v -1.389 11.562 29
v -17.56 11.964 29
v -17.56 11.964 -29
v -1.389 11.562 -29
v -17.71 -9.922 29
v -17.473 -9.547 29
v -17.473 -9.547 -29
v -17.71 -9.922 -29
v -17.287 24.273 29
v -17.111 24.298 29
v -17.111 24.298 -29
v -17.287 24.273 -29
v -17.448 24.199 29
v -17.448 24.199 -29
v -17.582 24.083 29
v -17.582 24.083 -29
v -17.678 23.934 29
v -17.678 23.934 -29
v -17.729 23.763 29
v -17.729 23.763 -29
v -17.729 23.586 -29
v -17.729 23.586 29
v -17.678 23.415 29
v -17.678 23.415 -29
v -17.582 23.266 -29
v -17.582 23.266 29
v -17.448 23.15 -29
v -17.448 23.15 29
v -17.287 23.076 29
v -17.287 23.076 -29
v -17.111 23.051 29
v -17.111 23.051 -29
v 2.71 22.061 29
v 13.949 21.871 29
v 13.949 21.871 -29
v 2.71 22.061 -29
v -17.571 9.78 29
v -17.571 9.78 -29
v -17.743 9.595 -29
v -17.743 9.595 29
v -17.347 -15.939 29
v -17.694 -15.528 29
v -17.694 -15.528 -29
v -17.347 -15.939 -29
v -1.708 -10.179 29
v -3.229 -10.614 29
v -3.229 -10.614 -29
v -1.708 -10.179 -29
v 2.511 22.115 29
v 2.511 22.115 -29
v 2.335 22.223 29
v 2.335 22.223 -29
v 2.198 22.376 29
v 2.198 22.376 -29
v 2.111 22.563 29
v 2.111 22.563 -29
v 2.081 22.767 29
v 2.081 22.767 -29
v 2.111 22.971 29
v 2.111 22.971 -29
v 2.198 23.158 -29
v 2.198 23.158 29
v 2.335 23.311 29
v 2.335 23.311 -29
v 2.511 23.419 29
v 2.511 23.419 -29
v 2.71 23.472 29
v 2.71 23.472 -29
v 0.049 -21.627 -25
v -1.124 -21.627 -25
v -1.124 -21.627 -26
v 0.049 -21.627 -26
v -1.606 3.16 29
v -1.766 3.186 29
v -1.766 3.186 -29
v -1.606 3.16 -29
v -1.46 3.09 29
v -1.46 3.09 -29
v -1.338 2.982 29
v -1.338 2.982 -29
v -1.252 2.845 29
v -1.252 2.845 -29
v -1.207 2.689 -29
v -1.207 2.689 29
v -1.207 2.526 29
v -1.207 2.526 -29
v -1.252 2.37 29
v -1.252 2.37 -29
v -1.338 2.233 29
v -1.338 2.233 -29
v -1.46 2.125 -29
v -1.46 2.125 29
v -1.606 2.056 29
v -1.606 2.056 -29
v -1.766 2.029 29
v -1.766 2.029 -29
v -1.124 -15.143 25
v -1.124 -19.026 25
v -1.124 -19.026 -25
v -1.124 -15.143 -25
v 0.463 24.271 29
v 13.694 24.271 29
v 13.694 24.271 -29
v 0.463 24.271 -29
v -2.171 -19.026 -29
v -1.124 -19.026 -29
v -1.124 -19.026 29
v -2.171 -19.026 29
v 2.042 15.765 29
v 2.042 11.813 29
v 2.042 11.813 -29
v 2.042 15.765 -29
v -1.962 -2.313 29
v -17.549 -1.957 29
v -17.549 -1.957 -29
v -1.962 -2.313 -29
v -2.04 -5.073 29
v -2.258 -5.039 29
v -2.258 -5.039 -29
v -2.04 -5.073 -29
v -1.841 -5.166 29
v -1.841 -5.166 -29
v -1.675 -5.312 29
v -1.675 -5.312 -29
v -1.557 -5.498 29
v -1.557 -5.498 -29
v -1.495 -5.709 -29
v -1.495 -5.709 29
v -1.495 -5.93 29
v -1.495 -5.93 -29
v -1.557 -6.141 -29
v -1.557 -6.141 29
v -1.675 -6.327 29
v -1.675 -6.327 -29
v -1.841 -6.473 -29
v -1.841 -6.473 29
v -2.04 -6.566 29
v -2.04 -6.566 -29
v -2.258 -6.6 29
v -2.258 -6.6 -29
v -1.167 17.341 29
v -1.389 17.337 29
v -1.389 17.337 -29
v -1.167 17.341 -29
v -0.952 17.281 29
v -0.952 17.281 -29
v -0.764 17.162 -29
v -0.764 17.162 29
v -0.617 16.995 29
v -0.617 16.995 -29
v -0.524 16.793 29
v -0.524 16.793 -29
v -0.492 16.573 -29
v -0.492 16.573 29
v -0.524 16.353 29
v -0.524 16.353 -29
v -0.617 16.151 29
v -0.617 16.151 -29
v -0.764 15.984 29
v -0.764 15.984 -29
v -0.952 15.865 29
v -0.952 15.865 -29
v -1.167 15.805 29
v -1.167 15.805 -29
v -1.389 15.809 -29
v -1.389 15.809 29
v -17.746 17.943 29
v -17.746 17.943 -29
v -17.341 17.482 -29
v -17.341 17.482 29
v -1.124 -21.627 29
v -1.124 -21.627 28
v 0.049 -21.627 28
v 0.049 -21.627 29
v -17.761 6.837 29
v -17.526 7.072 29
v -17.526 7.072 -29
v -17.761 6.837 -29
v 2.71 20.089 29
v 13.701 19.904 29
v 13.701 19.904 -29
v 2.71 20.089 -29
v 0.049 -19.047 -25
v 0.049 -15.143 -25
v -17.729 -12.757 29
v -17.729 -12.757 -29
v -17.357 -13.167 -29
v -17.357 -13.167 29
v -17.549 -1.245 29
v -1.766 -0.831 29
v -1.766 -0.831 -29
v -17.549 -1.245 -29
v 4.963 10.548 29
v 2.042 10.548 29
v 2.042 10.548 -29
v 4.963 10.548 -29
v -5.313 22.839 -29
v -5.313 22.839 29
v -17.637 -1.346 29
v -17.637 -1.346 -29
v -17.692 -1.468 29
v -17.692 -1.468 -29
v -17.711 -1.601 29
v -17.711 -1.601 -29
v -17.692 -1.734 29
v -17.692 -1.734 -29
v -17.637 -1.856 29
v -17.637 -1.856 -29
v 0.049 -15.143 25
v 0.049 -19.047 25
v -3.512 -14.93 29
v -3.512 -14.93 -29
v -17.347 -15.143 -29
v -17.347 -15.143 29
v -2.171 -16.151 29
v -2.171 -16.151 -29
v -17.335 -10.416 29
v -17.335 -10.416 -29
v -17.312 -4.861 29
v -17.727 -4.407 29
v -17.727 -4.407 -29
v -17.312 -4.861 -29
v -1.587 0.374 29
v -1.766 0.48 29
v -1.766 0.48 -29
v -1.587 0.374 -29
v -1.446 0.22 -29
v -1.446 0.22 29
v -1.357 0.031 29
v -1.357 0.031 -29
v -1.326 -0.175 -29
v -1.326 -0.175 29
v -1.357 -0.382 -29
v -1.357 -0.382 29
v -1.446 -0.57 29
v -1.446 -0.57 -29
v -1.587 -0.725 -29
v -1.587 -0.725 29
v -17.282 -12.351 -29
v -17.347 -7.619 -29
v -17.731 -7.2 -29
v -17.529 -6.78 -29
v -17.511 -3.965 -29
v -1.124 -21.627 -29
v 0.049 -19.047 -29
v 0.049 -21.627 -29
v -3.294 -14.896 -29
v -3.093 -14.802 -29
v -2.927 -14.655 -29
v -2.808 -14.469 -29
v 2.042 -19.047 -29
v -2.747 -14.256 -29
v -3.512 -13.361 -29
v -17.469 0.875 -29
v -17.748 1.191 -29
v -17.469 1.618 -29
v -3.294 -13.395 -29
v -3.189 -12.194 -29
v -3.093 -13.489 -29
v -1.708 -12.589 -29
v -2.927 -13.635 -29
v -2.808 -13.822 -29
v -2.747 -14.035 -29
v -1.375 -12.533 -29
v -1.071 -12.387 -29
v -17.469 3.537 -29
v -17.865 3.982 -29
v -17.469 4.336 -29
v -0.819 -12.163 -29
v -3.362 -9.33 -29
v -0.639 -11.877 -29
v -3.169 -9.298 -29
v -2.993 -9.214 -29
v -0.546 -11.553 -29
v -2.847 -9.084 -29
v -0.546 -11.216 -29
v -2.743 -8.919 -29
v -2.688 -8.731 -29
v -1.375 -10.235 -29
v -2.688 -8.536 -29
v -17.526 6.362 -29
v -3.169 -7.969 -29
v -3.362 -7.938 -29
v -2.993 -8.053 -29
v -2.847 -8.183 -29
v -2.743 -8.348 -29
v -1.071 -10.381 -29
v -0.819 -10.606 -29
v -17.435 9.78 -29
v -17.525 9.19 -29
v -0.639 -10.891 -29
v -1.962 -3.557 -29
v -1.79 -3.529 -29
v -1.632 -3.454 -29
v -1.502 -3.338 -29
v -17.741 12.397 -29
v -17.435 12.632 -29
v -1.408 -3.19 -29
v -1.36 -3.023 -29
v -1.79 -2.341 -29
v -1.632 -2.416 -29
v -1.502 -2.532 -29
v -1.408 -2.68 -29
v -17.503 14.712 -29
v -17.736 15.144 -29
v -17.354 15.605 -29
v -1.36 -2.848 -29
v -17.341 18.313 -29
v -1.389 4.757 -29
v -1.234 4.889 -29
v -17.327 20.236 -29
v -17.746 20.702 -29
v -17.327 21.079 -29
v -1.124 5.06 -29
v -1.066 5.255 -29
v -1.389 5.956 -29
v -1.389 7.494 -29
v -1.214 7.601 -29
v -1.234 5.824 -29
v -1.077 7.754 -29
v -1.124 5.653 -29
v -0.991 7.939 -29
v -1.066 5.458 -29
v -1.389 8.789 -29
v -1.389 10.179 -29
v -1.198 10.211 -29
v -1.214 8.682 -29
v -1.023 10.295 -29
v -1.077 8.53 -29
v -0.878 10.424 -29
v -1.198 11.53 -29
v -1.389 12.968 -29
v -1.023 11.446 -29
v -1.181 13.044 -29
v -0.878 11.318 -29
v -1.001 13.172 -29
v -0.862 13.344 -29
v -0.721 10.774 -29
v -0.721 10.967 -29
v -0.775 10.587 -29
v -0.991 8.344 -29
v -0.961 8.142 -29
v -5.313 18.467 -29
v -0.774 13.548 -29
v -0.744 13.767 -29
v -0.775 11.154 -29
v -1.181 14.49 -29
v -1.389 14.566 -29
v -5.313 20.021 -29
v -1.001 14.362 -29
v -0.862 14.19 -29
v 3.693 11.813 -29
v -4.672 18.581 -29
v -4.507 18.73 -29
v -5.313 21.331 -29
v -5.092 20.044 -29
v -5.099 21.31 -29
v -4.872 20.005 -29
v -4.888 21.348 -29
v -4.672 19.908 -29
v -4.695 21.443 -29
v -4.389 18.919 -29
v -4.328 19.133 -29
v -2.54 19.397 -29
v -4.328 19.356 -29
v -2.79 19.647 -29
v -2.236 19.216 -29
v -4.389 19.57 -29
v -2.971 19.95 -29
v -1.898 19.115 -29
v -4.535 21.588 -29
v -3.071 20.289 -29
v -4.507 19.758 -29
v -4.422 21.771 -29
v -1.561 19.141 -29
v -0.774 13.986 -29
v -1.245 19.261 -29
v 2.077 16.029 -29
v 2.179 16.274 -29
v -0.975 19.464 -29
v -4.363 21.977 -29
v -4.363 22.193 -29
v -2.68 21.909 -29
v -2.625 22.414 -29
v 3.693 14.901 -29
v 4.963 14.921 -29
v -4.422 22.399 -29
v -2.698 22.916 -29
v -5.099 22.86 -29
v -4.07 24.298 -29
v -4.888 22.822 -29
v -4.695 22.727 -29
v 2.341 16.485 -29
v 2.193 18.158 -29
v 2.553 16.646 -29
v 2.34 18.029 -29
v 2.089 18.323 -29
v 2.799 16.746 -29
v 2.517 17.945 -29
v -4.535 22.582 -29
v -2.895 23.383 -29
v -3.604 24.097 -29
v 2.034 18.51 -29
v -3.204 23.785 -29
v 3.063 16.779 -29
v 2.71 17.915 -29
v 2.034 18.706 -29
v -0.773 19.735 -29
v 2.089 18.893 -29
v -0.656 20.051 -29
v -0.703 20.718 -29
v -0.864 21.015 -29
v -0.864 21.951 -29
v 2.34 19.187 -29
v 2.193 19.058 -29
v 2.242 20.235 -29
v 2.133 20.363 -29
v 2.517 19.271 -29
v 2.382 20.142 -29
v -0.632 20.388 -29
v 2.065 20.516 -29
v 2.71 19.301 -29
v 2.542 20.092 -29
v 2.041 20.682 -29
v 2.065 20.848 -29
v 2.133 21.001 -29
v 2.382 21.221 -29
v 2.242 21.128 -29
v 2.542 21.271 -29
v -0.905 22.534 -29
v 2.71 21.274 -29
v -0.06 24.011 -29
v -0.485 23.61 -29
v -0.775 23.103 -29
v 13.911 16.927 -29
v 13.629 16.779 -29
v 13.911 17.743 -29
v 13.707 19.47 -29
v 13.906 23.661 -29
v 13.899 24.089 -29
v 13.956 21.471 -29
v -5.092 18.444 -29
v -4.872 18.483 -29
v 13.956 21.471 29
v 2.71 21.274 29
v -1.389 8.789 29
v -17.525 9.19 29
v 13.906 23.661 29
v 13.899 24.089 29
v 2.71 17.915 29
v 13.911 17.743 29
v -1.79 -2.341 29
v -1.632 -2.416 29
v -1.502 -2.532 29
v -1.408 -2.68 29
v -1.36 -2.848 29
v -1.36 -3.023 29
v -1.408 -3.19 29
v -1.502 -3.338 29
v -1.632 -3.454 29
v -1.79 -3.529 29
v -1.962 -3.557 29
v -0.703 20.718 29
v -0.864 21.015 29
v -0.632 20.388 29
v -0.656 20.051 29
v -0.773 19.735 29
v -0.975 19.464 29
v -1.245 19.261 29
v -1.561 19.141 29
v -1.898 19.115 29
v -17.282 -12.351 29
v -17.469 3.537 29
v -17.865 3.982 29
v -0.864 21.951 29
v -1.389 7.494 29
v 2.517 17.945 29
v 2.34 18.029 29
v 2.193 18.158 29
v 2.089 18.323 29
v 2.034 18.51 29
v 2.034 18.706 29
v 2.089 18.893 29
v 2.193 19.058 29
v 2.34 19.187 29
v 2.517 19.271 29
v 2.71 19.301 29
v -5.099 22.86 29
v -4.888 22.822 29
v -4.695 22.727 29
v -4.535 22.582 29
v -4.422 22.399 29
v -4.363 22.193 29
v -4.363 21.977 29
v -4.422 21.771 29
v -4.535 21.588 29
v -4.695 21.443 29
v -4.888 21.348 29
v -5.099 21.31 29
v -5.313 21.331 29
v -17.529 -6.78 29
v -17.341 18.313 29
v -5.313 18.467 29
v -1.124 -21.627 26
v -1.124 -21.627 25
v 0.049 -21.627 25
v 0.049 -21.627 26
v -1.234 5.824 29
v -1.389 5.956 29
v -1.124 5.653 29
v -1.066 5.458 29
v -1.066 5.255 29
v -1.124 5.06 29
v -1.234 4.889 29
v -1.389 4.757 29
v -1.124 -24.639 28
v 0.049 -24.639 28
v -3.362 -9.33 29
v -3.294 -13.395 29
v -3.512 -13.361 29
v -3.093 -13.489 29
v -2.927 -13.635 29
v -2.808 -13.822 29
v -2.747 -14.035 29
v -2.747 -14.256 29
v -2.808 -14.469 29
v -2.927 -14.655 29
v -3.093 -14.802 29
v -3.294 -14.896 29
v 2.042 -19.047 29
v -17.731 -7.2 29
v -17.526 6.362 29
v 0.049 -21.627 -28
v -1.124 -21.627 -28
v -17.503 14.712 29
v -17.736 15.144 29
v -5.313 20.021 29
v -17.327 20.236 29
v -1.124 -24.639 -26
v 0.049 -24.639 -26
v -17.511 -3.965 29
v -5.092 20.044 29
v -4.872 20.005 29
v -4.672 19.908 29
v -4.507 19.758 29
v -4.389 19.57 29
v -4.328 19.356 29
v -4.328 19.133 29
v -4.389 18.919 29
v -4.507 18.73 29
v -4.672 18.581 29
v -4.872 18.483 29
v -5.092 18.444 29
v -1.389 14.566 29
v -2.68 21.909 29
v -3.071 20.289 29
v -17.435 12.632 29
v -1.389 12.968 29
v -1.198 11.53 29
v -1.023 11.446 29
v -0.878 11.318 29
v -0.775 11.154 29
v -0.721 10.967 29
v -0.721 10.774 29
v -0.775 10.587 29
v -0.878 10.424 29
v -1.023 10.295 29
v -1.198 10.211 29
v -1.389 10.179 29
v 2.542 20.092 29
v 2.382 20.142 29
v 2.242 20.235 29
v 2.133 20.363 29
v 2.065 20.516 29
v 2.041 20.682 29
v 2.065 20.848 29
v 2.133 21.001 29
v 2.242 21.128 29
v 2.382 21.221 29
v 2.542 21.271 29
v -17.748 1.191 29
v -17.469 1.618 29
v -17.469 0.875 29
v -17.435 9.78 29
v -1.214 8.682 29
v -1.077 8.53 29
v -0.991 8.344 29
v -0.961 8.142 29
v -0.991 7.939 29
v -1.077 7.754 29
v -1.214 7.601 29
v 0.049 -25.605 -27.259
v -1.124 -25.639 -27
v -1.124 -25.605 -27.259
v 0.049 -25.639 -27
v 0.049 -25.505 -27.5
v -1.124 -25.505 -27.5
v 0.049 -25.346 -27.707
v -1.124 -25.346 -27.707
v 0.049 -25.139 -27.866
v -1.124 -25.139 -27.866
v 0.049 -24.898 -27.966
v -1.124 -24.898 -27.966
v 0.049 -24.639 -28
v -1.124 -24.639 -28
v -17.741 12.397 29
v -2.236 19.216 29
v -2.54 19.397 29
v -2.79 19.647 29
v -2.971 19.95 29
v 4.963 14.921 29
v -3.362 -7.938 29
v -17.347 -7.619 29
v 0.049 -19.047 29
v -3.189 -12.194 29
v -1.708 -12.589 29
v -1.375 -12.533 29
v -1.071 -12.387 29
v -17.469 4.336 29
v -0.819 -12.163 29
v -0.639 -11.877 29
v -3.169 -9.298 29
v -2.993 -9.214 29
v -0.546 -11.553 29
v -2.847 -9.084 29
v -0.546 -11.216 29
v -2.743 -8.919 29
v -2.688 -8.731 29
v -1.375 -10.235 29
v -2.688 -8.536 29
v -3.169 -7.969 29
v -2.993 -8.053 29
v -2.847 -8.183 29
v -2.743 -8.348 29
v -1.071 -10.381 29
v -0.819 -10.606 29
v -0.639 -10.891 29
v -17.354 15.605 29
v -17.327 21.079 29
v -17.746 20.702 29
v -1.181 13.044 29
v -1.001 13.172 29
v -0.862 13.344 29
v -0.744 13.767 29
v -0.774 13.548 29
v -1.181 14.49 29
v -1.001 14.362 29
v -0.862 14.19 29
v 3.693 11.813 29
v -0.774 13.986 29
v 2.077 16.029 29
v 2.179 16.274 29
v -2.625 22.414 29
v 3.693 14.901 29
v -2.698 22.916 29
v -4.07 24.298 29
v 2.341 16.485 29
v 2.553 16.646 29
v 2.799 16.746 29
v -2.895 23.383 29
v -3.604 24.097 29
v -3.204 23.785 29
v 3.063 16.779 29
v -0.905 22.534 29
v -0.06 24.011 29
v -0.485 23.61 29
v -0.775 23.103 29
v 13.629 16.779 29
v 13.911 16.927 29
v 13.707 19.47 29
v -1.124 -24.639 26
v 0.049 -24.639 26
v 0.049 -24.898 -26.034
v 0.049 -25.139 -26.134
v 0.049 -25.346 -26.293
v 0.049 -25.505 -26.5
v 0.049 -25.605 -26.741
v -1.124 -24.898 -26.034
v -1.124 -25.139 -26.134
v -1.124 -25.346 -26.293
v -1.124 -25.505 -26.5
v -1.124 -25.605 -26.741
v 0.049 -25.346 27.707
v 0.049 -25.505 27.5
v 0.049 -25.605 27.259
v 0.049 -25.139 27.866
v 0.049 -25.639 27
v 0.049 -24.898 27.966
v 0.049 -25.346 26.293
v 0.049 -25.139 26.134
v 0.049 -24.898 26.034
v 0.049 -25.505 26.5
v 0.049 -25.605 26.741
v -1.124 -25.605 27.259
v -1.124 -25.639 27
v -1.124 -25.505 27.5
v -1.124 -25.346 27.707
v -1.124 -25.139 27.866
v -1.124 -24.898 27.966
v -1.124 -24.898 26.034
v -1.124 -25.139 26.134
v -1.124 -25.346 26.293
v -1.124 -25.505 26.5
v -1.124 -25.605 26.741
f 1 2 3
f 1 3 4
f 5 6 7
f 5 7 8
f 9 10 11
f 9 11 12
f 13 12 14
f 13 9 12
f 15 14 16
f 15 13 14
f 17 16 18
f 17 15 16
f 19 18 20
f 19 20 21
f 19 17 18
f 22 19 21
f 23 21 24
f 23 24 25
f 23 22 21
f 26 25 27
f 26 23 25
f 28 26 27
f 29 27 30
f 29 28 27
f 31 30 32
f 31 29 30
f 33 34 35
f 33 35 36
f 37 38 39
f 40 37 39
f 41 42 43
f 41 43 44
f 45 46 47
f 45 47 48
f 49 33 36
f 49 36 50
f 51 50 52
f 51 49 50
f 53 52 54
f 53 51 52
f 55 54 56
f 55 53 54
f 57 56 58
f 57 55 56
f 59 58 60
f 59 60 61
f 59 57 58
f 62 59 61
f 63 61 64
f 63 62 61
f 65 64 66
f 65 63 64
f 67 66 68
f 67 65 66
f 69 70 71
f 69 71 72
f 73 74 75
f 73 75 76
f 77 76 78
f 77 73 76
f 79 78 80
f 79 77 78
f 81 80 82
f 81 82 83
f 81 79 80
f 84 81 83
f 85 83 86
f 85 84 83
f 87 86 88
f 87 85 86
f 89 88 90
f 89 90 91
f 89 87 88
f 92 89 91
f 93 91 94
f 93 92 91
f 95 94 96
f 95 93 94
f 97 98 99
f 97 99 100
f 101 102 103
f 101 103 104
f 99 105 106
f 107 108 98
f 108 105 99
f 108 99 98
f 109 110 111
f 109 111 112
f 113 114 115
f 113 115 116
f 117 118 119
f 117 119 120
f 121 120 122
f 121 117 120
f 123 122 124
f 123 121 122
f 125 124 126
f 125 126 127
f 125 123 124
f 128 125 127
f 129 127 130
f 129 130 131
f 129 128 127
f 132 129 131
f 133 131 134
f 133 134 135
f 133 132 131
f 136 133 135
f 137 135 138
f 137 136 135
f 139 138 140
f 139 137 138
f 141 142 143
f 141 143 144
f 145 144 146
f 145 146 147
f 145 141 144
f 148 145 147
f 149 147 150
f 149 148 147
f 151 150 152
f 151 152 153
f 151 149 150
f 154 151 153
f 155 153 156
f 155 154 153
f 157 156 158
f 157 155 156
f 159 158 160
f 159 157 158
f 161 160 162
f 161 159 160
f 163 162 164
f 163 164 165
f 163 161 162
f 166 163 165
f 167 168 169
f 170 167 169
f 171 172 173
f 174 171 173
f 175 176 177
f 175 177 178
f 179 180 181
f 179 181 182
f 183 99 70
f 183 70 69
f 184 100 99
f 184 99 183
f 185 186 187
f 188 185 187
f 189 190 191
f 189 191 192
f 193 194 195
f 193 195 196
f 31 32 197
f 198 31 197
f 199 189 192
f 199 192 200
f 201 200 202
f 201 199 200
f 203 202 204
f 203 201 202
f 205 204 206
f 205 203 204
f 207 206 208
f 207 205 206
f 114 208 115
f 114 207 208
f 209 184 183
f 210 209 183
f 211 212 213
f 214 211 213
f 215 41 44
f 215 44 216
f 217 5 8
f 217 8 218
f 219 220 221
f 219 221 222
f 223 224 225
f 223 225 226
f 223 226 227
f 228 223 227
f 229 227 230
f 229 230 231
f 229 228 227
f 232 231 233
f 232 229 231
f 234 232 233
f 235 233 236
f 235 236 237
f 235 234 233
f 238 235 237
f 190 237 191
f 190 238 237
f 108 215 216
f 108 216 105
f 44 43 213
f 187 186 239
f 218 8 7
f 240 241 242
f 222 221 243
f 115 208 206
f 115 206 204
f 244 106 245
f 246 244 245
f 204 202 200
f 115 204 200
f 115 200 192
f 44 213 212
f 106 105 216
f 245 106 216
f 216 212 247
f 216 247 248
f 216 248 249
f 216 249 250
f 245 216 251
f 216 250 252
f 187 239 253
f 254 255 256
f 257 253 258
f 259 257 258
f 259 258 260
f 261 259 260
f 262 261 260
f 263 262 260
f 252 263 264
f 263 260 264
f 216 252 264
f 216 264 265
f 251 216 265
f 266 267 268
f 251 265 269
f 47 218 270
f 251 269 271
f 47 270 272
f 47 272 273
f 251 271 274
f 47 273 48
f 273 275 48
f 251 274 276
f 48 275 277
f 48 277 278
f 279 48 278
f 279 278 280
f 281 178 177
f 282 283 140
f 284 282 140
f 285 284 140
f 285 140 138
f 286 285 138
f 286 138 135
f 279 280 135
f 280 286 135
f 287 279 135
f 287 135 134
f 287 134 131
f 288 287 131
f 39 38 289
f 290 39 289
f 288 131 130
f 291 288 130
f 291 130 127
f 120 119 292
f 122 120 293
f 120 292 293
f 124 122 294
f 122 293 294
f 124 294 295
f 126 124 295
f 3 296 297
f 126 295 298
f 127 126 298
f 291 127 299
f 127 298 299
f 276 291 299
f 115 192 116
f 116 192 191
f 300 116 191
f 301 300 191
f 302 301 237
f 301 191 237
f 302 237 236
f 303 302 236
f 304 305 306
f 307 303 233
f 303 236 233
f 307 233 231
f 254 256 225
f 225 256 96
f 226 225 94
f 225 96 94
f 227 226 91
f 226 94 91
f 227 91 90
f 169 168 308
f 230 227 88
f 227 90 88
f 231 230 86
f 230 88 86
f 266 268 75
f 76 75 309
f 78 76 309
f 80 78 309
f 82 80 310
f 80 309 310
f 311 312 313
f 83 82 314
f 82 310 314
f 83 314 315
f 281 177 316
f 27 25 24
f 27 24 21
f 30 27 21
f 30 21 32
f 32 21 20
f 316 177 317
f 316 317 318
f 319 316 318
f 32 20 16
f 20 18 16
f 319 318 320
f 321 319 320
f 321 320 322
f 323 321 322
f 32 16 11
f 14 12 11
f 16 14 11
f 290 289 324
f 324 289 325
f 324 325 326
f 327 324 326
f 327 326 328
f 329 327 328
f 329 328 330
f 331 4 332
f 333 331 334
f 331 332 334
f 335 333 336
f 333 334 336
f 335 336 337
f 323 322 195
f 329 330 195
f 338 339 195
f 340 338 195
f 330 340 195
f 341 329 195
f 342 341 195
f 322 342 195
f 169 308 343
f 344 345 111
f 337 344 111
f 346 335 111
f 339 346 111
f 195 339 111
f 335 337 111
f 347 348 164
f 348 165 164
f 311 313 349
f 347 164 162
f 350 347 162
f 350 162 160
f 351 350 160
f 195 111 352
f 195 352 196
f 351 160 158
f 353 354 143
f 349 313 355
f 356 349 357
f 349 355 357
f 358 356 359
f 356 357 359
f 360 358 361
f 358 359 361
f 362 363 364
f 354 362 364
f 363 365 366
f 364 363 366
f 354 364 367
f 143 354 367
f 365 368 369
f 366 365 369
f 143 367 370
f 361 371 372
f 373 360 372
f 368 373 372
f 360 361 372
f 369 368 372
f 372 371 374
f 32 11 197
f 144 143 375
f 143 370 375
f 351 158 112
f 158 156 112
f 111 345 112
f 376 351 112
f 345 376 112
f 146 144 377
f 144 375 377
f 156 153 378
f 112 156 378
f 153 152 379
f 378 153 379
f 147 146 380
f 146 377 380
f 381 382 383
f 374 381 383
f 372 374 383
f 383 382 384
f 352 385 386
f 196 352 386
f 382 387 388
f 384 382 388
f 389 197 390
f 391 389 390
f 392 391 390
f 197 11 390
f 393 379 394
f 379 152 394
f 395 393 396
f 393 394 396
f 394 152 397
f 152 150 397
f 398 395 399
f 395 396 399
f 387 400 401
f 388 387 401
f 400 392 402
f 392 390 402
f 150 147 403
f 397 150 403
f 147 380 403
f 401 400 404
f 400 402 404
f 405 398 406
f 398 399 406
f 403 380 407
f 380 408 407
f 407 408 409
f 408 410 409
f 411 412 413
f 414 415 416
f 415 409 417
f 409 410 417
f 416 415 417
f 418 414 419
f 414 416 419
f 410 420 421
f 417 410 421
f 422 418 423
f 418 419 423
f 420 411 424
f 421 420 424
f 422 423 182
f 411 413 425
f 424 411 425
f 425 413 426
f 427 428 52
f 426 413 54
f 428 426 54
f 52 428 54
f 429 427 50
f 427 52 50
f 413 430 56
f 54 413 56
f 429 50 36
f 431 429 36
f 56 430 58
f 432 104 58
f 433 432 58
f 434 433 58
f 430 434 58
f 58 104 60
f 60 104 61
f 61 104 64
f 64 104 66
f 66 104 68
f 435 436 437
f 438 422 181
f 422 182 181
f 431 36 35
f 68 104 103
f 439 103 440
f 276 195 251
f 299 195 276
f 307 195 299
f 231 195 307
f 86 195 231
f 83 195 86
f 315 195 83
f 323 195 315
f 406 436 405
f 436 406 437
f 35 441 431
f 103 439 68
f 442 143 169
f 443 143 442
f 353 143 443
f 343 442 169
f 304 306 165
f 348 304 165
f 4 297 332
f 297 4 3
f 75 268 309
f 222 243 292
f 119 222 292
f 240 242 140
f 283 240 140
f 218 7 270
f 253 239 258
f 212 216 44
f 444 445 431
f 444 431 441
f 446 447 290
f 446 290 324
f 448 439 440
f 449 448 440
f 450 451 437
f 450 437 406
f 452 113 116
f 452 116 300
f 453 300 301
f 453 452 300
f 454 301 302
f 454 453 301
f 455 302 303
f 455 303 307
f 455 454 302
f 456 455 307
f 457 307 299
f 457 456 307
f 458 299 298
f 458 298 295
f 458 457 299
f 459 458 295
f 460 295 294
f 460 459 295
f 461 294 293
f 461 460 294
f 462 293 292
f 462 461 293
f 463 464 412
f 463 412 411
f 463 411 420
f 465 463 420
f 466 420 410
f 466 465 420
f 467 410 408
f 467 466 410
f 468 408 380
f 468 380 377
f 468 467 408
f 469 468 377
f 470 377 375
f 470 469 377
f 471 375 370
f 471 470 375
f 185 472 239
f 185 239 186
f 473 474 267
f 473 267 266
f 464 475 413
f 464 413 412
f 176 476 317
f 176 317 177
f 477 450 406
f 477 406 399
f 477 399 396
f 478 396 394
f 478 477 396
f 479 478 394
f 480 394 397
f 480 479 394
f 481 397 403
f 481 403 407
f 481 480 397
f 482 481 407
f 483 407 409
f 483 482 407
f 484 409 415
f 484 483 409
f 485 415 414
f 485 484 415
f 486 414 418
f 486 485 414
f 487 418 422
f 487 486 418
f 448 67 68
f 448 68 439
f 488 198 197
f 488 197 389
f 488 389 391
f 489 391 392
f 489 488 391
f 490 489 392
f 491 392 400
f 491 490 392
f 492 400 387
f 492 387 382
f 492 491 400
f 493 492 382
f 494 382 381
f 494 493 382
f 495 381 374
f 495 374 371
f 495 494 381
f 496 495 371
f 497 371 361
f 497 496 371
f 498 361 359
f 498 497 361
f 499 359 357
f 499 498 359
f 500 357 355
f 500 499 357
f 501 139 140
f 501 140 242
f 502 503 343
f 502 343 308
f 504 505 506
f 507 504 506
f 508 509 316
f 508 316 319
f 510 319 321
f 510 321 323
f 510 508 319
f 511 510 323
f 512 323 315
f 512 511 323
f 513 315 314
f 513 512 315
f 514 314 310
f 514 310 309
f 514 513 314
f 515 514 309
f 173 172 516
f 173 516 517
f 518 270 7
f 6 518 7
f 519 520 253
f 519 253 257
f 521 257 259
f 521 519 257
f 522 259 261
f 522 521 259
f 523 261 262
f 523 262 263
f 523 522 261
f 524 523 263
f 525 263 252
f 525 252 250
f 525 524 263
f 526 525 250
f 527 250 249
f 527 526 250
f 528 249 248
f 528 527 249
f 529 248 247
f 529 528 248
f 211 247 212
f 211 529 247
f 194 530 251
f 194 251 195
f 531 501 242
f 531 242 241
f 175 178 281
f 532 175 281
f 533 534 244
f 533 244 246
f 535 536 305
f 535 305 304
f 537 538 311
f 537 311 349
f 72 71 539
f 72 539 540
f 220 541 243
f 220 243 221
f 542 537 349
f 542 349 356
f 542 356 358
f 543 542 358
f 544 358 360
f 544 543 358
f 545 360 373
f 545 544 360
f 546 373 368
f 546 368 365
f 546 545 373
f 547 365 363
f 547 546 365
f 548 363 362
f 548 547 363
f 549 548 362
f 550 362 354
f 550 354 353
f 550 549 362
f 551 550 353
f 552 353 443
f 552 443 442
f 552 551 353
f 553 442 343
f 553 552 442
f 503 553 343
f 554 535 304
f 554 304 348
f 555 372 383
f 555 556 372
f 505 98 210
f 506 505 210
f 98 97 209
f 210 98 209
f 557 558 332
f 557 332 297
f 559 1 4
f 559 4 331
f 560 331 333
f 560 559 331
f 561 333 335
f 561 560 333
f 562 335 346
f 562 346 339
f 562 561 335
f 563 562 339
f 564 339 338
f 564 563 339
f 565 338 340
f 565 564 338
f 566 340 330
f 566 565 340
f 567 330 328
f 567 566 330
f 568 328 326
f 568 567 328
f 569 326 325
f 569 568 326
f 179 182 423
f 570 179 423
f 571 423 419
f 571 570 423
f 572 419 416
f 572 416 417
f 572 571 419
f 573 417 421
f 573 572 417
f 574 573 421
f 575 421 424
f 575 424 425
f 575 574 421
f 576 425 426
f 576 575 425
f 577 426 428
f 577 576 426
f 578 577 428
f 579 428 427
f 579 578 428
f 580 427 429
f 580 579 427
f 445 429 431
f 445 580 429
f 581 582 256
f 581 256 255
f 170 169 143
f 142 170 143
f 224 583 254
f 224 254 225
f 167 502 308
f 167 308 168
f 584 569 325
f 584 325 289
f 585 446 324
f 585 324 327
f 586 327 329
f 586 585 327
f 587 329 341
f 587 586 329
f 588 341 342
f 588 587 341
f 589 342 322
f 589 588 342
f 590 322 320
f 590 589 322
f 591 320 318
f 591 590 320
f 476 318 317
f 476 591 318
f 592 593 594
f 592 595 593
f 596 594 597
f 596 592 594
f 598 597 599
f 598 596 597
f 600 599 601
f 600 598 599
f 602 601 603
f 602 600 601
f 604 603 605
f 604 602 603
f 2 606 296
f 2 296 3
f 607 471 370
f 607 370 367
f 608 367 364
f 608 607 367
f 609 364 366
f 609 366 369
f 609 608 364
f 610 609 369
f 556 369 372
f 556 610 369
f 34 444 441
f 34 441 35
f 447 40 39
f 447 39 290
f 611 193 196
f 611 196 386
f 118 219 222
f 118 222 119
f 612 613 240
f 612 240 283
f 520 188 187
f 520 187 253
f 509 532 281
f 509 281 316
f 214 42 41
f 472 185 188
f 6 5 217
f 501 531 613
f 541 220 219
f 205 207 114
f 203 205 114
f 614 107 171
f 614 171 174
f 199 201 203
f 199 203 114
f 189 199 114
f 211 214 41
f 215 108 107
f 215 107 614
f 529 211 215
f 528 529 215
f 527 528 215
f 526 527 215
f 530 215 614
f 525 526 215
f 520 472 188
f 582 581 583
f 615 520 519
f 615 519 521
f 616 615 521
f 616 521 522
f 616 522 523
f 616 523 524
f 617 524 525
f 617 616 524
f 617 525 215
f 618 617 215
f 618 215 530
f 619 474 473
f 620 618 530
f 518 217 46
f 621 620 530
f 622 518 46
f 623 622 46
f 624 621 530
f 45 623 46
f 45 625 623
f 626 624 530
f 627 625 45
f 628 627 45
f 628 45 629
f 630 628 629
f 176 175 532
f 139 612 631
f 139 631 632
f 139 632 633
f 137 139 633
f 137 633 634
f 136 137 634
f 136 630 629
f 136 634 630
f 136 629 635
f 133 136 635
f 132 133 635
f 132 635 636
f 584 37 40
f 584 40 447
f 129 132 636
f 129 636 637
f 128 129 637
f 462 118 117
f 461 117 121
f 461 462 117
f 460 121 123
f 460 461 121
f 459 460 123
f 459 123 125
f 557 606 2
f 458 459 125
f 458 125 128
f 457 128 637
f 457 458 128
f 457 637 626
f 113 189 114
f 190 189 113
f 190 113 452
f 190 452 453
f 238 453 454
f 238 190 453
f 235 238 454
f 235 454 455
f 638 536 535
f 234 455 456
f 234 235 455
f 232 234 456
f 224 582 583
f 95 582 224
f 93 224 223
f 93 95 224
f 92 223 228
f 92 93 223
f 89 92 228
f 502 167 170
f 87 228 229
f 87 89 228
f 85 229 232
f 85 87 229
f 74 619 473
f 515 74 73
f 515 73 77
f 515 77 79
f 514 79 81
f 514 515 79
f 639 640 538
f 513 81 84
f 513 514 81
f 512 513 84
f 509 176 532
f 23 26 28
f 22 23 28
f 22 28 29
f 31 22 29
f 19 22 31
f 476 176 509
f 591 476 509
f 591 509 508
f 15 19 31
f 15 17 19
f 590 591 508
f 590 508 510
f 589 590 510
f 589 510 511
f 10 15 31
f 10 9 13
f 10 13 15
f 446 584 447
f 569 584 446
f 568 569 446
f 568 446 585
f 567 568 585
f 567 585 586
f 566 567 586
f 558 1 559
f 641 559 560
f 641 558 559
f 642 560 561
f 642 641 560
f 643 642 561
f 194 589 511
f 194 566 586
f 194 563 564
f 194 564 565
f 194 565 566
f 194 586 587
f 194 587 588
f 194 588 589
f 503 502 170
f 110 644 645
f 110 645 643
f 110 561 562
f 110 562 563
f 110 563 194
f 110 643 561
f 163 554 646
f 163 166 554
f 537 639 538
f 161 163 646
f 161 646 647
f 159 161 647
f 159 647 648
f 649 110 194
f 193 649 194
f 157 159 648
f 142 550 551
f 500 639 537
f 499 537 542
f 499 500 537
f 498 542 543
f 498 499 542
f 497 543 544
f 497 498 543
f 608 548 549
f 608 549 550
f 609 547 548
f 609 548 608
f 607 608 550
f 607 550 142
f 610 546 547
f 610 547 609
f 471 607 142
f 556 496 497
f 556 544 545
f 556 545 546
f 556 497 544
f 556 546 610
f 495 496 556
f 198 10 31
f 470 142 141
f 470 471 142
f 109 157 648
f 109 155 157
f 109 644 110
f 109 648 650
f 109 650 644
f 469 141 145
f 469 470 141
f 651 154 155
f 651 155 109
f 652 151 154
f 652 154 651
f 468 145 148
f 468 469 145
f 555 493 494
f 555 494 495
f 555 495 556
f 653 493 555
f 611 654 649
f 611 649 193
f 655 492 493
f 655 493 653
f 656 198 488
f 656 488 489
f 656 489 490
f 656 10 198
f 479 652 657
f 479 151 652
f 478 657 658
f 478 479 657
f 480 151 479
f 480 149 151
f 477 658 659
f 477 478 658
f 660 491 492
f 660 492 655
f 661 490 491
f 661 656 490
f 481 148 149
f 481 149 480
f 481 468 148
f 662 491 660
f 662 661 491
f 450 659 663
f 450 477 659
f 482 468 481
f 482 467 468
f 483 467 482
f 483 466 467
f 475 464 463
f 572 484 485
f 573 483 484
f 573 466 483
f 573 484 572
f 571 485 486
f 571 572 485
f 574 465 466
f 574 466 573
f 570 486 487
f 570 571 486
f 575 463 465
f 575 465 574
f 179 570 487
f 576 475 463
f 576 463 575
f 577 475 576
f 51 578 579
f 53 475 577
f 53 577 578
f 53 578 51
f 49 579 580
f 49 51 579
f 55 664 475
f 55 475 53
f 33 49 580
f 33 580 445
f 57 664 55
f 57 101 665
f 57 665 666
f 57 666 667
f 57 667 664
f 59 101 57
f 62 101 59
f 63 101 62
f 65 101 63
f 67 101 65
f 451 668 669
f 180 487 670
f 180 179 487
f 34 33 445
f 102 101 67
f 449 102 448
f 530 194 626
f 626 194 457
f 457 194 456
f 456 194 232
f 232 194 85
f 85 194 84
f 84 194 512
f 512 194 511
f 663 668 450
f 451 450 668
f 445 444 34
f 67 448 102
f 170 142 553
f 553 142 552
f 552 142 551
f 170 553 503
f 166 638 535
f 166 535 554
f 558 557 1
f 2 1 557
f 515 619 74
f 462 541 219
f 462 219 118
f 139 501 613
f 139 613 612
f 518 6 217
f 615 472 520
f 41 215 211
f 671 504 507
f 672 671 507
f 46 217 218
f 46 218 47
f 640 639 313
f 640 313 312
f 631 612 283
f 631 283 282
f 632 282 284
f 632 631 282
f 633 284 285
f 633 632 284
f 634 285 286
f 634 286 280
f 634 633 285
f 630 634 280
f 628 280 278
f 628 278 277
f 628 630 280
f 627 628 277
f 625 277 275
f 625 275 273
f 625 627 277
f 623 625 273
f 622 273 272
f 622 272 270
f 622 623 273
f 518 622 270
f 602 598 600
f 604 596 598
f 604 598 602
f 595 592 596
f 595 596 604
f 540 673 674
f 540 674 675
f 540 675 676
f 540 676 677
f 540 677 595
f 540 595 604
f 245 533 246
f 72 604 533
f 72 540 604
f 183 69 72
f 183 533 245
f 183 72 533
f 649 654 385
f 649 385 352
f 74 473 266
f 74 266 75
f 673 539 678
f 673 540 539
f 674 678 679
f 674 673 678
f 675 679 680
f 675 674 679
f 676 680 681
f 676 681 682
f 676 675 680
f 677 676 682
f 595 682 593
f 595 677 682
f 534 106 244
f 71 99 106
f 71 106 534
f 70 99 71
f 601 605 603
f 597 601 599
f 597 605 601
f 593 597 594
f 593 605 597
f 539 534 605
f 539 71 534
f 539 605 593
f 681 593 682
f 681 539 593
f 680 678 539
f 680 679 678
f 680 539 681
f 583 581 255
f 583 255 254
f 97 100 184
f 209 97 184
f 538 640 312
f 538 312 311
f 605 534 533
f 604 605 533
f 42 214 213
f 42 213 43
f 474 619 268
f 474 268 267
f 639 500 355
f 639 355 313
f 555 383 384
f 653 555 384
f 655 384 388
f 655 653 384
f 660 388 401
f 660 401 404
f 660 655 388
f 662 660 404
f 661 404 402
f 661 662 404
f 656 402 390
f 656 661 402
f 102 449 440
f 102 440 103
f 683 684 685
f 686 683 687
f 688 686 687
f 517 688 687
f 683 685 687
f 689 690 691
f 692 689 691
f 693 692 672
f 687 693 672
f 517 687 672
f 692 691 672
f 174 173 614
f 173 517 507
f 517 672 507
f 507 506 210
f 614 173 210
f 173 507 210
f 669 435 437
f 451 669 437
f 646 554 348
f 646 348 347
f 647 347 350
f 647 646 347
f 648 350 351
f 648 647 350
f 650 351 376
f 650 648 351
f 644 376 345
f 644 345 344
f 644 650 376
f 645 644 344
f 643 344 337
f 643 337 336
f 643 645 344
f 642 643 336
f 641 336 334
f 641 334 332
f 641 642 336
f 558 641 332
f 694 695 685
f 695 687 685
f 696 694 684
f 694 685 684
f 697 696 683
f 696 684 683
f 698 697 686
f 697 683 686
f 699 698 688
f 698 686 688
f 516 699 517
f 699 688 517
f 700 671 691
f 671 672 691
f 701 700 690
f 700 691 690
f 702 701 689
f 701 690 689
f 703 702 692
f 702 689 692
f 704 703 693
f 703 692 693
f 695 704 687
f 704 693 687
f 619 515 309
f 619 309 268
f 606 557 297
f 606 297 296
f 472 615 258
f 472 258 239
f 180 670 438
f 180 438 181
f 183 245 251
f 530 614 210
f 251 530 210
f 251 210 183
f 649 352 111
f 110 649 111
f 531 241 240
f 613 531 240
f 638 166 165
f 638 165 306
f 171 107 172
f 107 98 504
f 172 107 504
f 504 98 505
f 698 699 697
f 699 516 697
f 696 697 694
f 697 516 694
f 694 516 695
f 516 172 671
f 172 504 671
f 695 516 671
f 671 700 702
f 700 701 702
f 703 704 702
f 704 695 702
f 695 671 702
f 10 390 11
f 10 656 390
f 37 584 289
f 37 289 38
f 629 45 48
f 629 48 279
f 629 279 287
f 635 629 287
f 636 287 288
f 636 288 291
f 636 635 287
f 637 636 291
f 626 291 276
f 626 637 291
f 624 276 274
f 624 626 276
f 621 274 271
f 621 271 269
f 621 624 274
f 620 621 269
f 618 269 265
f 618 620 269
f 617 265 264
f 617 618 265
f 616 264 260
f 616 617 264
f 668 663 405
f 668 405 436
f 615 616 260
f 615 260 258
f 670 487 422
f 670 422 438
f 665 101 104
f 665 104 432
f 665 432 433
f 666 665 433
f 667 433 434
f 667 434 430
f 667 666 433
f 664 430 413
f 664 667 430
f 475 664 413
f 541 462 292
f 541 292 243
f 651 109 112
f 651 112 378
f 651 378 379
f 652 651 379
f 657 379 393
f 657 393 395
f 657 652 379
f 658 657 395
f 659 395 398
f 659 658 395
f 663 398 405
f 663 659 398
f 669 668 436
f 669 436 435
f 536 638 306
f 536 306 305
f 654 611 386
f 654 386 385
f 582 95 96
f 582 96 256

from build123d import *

# Parameters (mm, degrees)
F1_DEPTH = 29
F2_START = 25
F2_DEPTH = 4
F3_START = -25
F3_DEPTH = 4
F4_START = 26
F0_W     = 1.172746277
F0_H     = 3.0541475862
F0_H_2   = 0.957692816
F4_DEPTH = 2
F5_START = -26
F5_DEPTH = 2
F6_R     = 0.99999


# Not quite as in the source:
# - a fillet or chamfer is up to 0.001 mm smaller than in the source, because OpenCascade refuses the exact size


with BuildPart() as f1:
    # F0 (on Top) → F1 (new body, symmetric)
    with BuildSketch(Plane.XY):
        with BuildLine():
            Line((-4.0699890815, 24.2982581258), (-17.1110220253, 24.2982581258))
            ThreePointArc((-17.1110220253, 24.2982581258), (-17.7348526195, 23.6744275317), (-17.1110220253, 23.0505969375))
            Line((-17.1110220253, 23.0505969375), (-5.313185975, 22.8393822908))
            ThreePointArc((-5.313185975, 22.8393822908), (-4.3551853687, 22.085041739), (-5.313185975, 21.3307011873))
            Line((-5.313185975, 21.3307011873), (-17.3267684877, 21.0792534053))
            Line((-17.3267684877, 21.0792534053), (-17.7458468825, 20.7020826638))
            Line((-17.7458468825, 20.7020826638), (-17.3267684877, 20.2364402329))
            Line((-17.3267684877, 20.2364402329), (-5.313185975, 20.0213631141))
            ThreePointArc((-5.313185975, 20.0213631141), (-4.319986106, 19.2441805029), (-5.313185975, 18.4669978917))
            Line((-5.313185975, 18.4669978917), (-17.3407383263, 18.3133352548))
            Line((-17.3407383263, 18.3133352548), (-17.7458468825, 17.9431512952))
            Line((-17.7458468825, 17.9431512952), (-17.3407383263, 17.4823310226))
            Line((-17.3407383263, 17.4823310226), (-1.3890911359, 17.3372328281))
            ThreePointArc((-1.3890911359, 17.3372328281), (-0.492008259, 16.5730640292), (-1.3890911359, 15.8088952303))
            Line((-1.3890911359, 15.8088952303), (-17.3541552482, 15.6049273923))
            Line((-17.3541552482, 15.6049273923), (-17.7356619388, 15.1443993673))
            Line((-17.7356619388, 15.1443993673), (-17.5030883402, 14.7124780342))
            Line((-17.5030883402, 14.7124780342), (-1.3890911359, 14.5659030835))
            ThreePointArc((-1.3890911359, 14.5659030835), (-0.7437511811, 13.7670414267), (-1.3890911359, 12.9681797698))
            Line((-1.3890911359, 12.9681797698), (-17.4349947409, 12.6323343327))
            Line((-17.4349947409, 12.6323343327), (-17.7414808422, 12.3967602849))
            Line((-17.7414808422, 12.3967602849), (-17.5598803908, 11.9637120515))
            Line((-17.5598803908, 11.9637120515), (-1.3890911359, 11.5619925782))
            ThreePointArc((-1.3890911359, 11.5619925782), (-0.7146102661, 10.8705479652), (-1.3890911359, 10.1791033521))
            Line((-1.3890911359, 10.1791033521), (-17.4349947409, 9.7804863246))
            Line((-17.4349947409, 9.7804863246), (-17.57148467, 9.7804863246))
            Line((-17.57148467, 9.7804863246), (-17.7426468581, 9.5952115953))
            Line((-17.7426468581, 9.5952115953), (-17.5253339112, 9.1899503022))
            Line((-17.5253339112, 9.1899503022), (-1.3890911359, 8.7890890427))
            ThreePointArc((-1.3890911359, 8.7890890427), (-0.9606665076, 8.1417476758), (-1.3890911359, 7.494406309))
            Line((-1.3890911359, 7.494406309), (-17.5261050463, 7.0715243928))
            Line((-17.5261050463, 7.0715243928), (-17.7610386163, 6.8365903571))
            Line((-17.7610386163, 6.8365903571), (-17.5261050463, 6.3615223657))
            Line((-17.5261050463, 6.3615223657), (-1.3890911359, 5.9555862099))
            ThreePointArc((-1.3890911359, 5.9555862099), (-1.0583889027, 5.3565036505), (-1.3890911359, 4.7574210912))
            Line((-1.3890911359, 4.7574210912), (-17.4686410496, 4.3360450599))
            Line((-17.4686410496, 4.3360450599), (-17.8654273587, 3.982137423))
            Line((-17.8654273587, 3.982137423), (-17.4686410496, 3.5372773558))
            Line((-17.4686410496, 3.5372773558), (-1.7663730541, 3.1859290281))
            ThreePointArc((-1.7663730541, 3.1859290281), (-1.2007925503, 2.6075517307), (-1.7663730541, 2.0291744333))
            Line((-1.7663730541, 2.0291744333), (-17.4686410496, 1.6176853427))
            Line((-17.4686410496, 1.6176853427), (-17.7483521402, 1.1909720488))
            Line((-17.7483521402, 1.1909720488), (-17.4686410496, 0.8753370494))
            Line((-17.4686410496, 0.8753370494), (-1.7663730541, 0.4803371849))
            ThreePointArc((-1.7663730541, 0.4803371849), (-1.3259179646, -0.1754465338), (-1.7663730541, -0.8312302525))
            Line((-1.7663730541, -0.8312302525), (-17.5491847508, -1.244830048))
            ThreePointArc((-17.5491847508, -1.244830048), (-17.7110050083, -1.6010632209), (-17.5491847508, -1.9572963938))
            Line((-17.5491847508, -1.9572963938), (-1.9620249514, -2.3128963076))
            ThreePointArc((-1.9620249514, -2.3128963076), (-1.3537602225, -2.9351960402), (-1.9620249514, -3.5574957728))
            Line((-1.9620249514, -3.5574957728), (-17.5113877616, -3.9649778744))
            Line((-17.5113877616, -3.9649778744), (-17.7269522101, -4.4069844298))
            Line((-17.7269522101, -4.4069844298), (-17.312085256, -4.8613618128))
            Line((-17.312085256, -4.8613618128), (-2.2583589889, -5.0391620025))
            ThreePointArc((-2.2583589889, -5.0391620025), (-1.4871772278, -5.8195060119), (-2.2583589889, -6.5998500213))
            Line((-2.2583589889, -6.5998500213), (-17.5293660294, -6.7802165233))
            Line((-17.5293660294, -6.7802165233), (-17.7314169705, -7.1995011531))
            Line((-17.7314169705, -7.1995011531), (-17.3472613096, -7.6185795479))
            Line((-17.3472613096, -7.6185795479), (-3.3617539701, -7.9376399327))
            ThreePointArc((-3.3617539701, -7.9376399327), (-2.6814550827, -8.6336359286), (-3.3617539701, -9.3296319246))
            Line((-3.3617539701, -9.3296319246), (-17.4733772874, -9.5469430089))
            Line((-17.4733772874, -9.5469430089), (-17.710454762, -9.9222976714))
            Line((-17.710454762, -9.9222976714), (-17.335081473, -10.4161864147))
            Line((-17.335081473, -10.4161864147), (-3.228909336, -10.6137422845))
            Line((-3.228909336, -10.6137422845), (-1.7076556105, -10.1791201159))
            ThreePointArc((-1.7076556105, -10.1791201159), (-0.5341015375, -11.3842086866), (-1.7076556105, -12.5892972574))
            Line((-1.7076556105, -12.5892972574), (-3.189396346, -12.1941864491))
            Line((-3.189396346, -12.1941864491), (-17.2815993428, -12.3514840379))
            Line((-17.2815993428, -12.3514840379), (-17.7286379039, -12.7565935254))
            Line((-17.7286379039, -12.7565935254), (-17.3566557611, -13.1670760419))
            Line((-17.3566557611, -13.1670760419), (-3.5123708679, -13.3609642008))
            ThreePointArc((-3.5123708679, -13.3609642008), (-2.7387752862, -14.1454697919), (-3.5123708679, -14.929975383))
            Line((-3.5123708679, -14.929975383), (-17.3472613096, -15.1430249362))
            Line((-17.3472613096, -15.1430249362), (-17.6943112165, -15.5275696889))
            Line((-17.6943112165, -15.5275696889), (-17.3472613096, -15.9387048334))
            Line((-17.3472613096, -15.9387048334), (-2.1711152967, -16.1512456061))
            Line((-2.1711152967, -16.1512456061), (-2.1711152967, -19.0259180963))
            Line((-2.1711152967, -19.0259180963), (-1.1235726997, -19.0259180963))
            Line((-1.1235726997, -19.0259180963), (-1.1235726997, -15.1430249362))
            Line((-1.1235726997, -15.1430249362), (0.0491735773, -15.1430249362))
            Line((0.0491735773, -15.1430249362), (0.0491735773, -19.047325477))
            Line((0.0491735773, -19.047325477), (2.0417859778, -19.047325477))
            Line((2.0417859778, -19.047325477), (2.0417859778, 10.5479126796))
            Line((2.0417859778, 10.5479126796), (4.9630478024, 10.5479126796))
            Line((4.9630478024, 10.5479126796), (4.9630478024, 14.9210141972))
            Line((4.9630478024, 14.9210141972), (3.692939326, 14.901455239))
            Line((3.692939326, 14.901455239), (3.692939326, 11.8128489703))
            Line((3.692939326, 11.8128489703), (2.0417859778, 11.8128489703))
            Line((2.0417859778, 11.8128489703), (2.0417859778, 15.7654304057))
            ThreePointArc((2.0417859778, 15.7654304057), (2.3413387619, 16.4847297298), (3.0629034154, 16.7787838727))
            Line((3.0629034154, 16.7787838727), (13.6287314817, 16.7787838727))
            Line((13.6287314817, 16.7787838727), (13.9106530696, 16.9266853482))
            Line((13.9106530696, 16.9266853482), (13.9106530696, 17.7426013646))
            Line((13.9106530696, 17.7426013646), (2.7096215636, 17.9149005562))
            ThreePointArc((2.7096215636, 17.9149005562), (2.027143744, 18.6079572886), (2.7096215636, 19.301014021))
            Line((2.7096215636, 19.301014021), (13.7074142694, 19.4701869041))
            Line((13.7074142694, 19.4701869041), (13.7007343839, 19.9044408738))
            Line((13.7007343839, 19.9044408738), (2.7096215636, 20.0889185071))
            ThreePointArc((2.7096215636, 20.0889185071), (2.0410304994, 20.6815851852), (2.7096215636, 21.2742518634))
            Line((2.7096215636, 21.2742518634), (13.9556201175, 21.4712414891))
            Line((13.9556201175, 21.4712414891), (13.9486206756, 21.8708346796))
            Line((13.9486206756, 21.8708346796), (2.7096215636, 22.0614876598))
            ThreePointArc((2.7096215636, 22.0614876598), (2.0808096295, 22.7669365704), (2.7096215636, 23.472385481))
            Line((2.7096215636, 23.472385481), (13.9058372006, 23.6605741084))
            Line((13.9058372006, 23.6605741084), (13.8986392592, 24.088813075))
            Line((13.8986392592, 24.088813075), (13.6943962425, 24.271402508))
            Line((13.6943962425, 24.271402508), (0.4630363837, 24.271402508))
            ThreePointArc((0.4630363837, 24.271402508), (-0.6487056649, 23.3676230344), (-0.8640453452, 21.9511426985))
            Line((-0.8640453452, 21.9511426985), (-0.8640453452, 21.0152007639))
            ThreePointArc((-0.8640453452, 21.0152007639), (-0.7734316844, 19.7347502036), (-1.897772192, 19.1153772175))
            ThreePointArc((-1.897772192, 19.1153772175), (-2.6726628699, 19.513906378), (-3.0711919535, 20.2887970954))
            Line((-3.0711919535, 20.2887970954), (-2.680051839, 21.9092350453))
            ThreePointArc((-2.680051839, 21.9092350453), (-2.8952979424, 23.3828498722), (-4.0699890815, 24.2982581258))
        make_face()
    extrude(amount=F1_DEPTH, both=True)

    # F0 (on Top) → F2 (join)
    with BuildSketch(Plane.XY.offset(F2_START)):
        Polygon((0.0491735773, -21.6273944825), (0.0491735773, -19.047325477), (0.0491735773, -15.1430249362), (-1.1235726997, -15.1430249362), (-1.1235726997, -19.0259180963), (-1.1235726997, -21.6273944825), align=None)
    extrude(amount=F2_DEPTH)

    # F0 (on Top) → F3 (join)
    with BuildSketch(Plane.XY.offset(F3_START)):
        Polygon((0.0491735773, -21.6273944825), (0.0491735773, -19.047325477), (0.0491735773, -15.1430249362), (-1.1235726997, -15.1430249362), (-1.1235726997, -19.0259180963), (-1.1235726997, -21.6273944825), align=None)
    extrude(amount=-F3_DEPTH)

    # F0 (on Top) → F4 (join)
    with BuildSketch(Plane.XY.offset(F4_START)):
        with Locations((-0.5371995612, -23.1544682756)):
            Rectangle(F0_W, F0_H)
        with Locations((-0.5371995612, -25.1603884767)):
            Rectangle(F0_W, F0_H_2)
    extrude(amount=F4_DEPTH)

    # F0 (on Top) → F5 (join)
    with BuildSketch(Plane.XY.offset(F5_START)):
        with Locations((-0.5371995612, -23.1544682756)):
            Rectangle(F0_W, F0_H)
        with Locations((-0.5371995612, -25.1603884767)):
            Rectangle(F0_W, F0_H_2)
    extrude(amount=-F5_DEPTH)

    # F6 (radius 1 in the source; OpenCascade refuses exactly that, so slightly less here)
    f6_edges = [f1.edges().sort_by_distance(p)[0] for p in [
        (-0.5372, -25.639235, 28),
        (-0.5372, -25.639235, 26),
        (-0.5372, -25.639235, -26),
        (-0.5372, -25.639235, -28),
    ]]
    fillet(f6_edges, radius=F6_R)


solid = f1.part
